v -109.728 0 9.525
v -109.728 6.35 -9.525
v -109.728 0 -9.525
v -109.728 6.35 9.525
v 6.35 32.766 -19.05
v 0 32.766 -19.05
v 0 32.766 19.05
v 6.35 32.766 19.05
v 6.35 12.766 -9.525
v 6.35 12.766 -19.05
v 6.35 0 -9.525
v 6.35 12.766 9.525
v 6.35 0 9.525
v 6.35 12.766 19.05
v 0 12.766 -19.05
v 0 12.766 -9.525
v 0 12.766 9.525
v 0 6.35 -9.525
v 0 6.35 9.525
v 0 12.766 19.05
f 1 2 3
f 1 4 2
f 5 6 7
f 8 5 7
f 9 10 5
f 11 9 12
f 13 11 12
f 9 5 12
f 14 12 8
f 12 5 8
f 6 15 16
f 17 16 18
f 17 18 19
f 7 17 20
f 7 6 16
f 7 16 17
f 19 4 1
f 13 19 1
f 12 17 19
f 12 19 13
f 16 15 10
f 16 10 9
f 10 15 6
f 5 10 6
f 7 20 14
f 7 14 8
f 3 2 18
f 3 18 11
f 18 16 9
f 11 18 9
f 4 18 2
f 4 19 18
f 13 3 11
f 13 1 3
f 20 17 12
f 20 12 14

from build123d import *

# Parameters (mm, degrees)
BOSS_EXTRUDE1_DEPTH = 9.525
SKETCH3_W           = 38.1
SKETCH3_H           = 20
BOSS_EXTRUDE2_DEPTH = 6.35


with BuildPart() as part:
    # Sketch2 → Boss-Extrude1 (new body, symmetric)
    with BuildSketch(Plane.XY):
        Polygon((-109.728, 0), (0, 0), (6.35, 0), (6.35, 32.766), (0, 32.766), (0, 6.35), (-109.728, 6.35), align=None)
    extrude(amount=BOSS_EXTRUDE1_DEPTH, both=True)

    # Sketch3 → Boss-Extrude2 (add)
    with BuildSketch(Plane.ZY):
        with Locations((0, 22.766)):
            Rectangle(SKETCH3_W, SKETCH3_H)
    extrude(amount=-BOSS_EXTRUDE2_DEPTH)


solid = part.part
